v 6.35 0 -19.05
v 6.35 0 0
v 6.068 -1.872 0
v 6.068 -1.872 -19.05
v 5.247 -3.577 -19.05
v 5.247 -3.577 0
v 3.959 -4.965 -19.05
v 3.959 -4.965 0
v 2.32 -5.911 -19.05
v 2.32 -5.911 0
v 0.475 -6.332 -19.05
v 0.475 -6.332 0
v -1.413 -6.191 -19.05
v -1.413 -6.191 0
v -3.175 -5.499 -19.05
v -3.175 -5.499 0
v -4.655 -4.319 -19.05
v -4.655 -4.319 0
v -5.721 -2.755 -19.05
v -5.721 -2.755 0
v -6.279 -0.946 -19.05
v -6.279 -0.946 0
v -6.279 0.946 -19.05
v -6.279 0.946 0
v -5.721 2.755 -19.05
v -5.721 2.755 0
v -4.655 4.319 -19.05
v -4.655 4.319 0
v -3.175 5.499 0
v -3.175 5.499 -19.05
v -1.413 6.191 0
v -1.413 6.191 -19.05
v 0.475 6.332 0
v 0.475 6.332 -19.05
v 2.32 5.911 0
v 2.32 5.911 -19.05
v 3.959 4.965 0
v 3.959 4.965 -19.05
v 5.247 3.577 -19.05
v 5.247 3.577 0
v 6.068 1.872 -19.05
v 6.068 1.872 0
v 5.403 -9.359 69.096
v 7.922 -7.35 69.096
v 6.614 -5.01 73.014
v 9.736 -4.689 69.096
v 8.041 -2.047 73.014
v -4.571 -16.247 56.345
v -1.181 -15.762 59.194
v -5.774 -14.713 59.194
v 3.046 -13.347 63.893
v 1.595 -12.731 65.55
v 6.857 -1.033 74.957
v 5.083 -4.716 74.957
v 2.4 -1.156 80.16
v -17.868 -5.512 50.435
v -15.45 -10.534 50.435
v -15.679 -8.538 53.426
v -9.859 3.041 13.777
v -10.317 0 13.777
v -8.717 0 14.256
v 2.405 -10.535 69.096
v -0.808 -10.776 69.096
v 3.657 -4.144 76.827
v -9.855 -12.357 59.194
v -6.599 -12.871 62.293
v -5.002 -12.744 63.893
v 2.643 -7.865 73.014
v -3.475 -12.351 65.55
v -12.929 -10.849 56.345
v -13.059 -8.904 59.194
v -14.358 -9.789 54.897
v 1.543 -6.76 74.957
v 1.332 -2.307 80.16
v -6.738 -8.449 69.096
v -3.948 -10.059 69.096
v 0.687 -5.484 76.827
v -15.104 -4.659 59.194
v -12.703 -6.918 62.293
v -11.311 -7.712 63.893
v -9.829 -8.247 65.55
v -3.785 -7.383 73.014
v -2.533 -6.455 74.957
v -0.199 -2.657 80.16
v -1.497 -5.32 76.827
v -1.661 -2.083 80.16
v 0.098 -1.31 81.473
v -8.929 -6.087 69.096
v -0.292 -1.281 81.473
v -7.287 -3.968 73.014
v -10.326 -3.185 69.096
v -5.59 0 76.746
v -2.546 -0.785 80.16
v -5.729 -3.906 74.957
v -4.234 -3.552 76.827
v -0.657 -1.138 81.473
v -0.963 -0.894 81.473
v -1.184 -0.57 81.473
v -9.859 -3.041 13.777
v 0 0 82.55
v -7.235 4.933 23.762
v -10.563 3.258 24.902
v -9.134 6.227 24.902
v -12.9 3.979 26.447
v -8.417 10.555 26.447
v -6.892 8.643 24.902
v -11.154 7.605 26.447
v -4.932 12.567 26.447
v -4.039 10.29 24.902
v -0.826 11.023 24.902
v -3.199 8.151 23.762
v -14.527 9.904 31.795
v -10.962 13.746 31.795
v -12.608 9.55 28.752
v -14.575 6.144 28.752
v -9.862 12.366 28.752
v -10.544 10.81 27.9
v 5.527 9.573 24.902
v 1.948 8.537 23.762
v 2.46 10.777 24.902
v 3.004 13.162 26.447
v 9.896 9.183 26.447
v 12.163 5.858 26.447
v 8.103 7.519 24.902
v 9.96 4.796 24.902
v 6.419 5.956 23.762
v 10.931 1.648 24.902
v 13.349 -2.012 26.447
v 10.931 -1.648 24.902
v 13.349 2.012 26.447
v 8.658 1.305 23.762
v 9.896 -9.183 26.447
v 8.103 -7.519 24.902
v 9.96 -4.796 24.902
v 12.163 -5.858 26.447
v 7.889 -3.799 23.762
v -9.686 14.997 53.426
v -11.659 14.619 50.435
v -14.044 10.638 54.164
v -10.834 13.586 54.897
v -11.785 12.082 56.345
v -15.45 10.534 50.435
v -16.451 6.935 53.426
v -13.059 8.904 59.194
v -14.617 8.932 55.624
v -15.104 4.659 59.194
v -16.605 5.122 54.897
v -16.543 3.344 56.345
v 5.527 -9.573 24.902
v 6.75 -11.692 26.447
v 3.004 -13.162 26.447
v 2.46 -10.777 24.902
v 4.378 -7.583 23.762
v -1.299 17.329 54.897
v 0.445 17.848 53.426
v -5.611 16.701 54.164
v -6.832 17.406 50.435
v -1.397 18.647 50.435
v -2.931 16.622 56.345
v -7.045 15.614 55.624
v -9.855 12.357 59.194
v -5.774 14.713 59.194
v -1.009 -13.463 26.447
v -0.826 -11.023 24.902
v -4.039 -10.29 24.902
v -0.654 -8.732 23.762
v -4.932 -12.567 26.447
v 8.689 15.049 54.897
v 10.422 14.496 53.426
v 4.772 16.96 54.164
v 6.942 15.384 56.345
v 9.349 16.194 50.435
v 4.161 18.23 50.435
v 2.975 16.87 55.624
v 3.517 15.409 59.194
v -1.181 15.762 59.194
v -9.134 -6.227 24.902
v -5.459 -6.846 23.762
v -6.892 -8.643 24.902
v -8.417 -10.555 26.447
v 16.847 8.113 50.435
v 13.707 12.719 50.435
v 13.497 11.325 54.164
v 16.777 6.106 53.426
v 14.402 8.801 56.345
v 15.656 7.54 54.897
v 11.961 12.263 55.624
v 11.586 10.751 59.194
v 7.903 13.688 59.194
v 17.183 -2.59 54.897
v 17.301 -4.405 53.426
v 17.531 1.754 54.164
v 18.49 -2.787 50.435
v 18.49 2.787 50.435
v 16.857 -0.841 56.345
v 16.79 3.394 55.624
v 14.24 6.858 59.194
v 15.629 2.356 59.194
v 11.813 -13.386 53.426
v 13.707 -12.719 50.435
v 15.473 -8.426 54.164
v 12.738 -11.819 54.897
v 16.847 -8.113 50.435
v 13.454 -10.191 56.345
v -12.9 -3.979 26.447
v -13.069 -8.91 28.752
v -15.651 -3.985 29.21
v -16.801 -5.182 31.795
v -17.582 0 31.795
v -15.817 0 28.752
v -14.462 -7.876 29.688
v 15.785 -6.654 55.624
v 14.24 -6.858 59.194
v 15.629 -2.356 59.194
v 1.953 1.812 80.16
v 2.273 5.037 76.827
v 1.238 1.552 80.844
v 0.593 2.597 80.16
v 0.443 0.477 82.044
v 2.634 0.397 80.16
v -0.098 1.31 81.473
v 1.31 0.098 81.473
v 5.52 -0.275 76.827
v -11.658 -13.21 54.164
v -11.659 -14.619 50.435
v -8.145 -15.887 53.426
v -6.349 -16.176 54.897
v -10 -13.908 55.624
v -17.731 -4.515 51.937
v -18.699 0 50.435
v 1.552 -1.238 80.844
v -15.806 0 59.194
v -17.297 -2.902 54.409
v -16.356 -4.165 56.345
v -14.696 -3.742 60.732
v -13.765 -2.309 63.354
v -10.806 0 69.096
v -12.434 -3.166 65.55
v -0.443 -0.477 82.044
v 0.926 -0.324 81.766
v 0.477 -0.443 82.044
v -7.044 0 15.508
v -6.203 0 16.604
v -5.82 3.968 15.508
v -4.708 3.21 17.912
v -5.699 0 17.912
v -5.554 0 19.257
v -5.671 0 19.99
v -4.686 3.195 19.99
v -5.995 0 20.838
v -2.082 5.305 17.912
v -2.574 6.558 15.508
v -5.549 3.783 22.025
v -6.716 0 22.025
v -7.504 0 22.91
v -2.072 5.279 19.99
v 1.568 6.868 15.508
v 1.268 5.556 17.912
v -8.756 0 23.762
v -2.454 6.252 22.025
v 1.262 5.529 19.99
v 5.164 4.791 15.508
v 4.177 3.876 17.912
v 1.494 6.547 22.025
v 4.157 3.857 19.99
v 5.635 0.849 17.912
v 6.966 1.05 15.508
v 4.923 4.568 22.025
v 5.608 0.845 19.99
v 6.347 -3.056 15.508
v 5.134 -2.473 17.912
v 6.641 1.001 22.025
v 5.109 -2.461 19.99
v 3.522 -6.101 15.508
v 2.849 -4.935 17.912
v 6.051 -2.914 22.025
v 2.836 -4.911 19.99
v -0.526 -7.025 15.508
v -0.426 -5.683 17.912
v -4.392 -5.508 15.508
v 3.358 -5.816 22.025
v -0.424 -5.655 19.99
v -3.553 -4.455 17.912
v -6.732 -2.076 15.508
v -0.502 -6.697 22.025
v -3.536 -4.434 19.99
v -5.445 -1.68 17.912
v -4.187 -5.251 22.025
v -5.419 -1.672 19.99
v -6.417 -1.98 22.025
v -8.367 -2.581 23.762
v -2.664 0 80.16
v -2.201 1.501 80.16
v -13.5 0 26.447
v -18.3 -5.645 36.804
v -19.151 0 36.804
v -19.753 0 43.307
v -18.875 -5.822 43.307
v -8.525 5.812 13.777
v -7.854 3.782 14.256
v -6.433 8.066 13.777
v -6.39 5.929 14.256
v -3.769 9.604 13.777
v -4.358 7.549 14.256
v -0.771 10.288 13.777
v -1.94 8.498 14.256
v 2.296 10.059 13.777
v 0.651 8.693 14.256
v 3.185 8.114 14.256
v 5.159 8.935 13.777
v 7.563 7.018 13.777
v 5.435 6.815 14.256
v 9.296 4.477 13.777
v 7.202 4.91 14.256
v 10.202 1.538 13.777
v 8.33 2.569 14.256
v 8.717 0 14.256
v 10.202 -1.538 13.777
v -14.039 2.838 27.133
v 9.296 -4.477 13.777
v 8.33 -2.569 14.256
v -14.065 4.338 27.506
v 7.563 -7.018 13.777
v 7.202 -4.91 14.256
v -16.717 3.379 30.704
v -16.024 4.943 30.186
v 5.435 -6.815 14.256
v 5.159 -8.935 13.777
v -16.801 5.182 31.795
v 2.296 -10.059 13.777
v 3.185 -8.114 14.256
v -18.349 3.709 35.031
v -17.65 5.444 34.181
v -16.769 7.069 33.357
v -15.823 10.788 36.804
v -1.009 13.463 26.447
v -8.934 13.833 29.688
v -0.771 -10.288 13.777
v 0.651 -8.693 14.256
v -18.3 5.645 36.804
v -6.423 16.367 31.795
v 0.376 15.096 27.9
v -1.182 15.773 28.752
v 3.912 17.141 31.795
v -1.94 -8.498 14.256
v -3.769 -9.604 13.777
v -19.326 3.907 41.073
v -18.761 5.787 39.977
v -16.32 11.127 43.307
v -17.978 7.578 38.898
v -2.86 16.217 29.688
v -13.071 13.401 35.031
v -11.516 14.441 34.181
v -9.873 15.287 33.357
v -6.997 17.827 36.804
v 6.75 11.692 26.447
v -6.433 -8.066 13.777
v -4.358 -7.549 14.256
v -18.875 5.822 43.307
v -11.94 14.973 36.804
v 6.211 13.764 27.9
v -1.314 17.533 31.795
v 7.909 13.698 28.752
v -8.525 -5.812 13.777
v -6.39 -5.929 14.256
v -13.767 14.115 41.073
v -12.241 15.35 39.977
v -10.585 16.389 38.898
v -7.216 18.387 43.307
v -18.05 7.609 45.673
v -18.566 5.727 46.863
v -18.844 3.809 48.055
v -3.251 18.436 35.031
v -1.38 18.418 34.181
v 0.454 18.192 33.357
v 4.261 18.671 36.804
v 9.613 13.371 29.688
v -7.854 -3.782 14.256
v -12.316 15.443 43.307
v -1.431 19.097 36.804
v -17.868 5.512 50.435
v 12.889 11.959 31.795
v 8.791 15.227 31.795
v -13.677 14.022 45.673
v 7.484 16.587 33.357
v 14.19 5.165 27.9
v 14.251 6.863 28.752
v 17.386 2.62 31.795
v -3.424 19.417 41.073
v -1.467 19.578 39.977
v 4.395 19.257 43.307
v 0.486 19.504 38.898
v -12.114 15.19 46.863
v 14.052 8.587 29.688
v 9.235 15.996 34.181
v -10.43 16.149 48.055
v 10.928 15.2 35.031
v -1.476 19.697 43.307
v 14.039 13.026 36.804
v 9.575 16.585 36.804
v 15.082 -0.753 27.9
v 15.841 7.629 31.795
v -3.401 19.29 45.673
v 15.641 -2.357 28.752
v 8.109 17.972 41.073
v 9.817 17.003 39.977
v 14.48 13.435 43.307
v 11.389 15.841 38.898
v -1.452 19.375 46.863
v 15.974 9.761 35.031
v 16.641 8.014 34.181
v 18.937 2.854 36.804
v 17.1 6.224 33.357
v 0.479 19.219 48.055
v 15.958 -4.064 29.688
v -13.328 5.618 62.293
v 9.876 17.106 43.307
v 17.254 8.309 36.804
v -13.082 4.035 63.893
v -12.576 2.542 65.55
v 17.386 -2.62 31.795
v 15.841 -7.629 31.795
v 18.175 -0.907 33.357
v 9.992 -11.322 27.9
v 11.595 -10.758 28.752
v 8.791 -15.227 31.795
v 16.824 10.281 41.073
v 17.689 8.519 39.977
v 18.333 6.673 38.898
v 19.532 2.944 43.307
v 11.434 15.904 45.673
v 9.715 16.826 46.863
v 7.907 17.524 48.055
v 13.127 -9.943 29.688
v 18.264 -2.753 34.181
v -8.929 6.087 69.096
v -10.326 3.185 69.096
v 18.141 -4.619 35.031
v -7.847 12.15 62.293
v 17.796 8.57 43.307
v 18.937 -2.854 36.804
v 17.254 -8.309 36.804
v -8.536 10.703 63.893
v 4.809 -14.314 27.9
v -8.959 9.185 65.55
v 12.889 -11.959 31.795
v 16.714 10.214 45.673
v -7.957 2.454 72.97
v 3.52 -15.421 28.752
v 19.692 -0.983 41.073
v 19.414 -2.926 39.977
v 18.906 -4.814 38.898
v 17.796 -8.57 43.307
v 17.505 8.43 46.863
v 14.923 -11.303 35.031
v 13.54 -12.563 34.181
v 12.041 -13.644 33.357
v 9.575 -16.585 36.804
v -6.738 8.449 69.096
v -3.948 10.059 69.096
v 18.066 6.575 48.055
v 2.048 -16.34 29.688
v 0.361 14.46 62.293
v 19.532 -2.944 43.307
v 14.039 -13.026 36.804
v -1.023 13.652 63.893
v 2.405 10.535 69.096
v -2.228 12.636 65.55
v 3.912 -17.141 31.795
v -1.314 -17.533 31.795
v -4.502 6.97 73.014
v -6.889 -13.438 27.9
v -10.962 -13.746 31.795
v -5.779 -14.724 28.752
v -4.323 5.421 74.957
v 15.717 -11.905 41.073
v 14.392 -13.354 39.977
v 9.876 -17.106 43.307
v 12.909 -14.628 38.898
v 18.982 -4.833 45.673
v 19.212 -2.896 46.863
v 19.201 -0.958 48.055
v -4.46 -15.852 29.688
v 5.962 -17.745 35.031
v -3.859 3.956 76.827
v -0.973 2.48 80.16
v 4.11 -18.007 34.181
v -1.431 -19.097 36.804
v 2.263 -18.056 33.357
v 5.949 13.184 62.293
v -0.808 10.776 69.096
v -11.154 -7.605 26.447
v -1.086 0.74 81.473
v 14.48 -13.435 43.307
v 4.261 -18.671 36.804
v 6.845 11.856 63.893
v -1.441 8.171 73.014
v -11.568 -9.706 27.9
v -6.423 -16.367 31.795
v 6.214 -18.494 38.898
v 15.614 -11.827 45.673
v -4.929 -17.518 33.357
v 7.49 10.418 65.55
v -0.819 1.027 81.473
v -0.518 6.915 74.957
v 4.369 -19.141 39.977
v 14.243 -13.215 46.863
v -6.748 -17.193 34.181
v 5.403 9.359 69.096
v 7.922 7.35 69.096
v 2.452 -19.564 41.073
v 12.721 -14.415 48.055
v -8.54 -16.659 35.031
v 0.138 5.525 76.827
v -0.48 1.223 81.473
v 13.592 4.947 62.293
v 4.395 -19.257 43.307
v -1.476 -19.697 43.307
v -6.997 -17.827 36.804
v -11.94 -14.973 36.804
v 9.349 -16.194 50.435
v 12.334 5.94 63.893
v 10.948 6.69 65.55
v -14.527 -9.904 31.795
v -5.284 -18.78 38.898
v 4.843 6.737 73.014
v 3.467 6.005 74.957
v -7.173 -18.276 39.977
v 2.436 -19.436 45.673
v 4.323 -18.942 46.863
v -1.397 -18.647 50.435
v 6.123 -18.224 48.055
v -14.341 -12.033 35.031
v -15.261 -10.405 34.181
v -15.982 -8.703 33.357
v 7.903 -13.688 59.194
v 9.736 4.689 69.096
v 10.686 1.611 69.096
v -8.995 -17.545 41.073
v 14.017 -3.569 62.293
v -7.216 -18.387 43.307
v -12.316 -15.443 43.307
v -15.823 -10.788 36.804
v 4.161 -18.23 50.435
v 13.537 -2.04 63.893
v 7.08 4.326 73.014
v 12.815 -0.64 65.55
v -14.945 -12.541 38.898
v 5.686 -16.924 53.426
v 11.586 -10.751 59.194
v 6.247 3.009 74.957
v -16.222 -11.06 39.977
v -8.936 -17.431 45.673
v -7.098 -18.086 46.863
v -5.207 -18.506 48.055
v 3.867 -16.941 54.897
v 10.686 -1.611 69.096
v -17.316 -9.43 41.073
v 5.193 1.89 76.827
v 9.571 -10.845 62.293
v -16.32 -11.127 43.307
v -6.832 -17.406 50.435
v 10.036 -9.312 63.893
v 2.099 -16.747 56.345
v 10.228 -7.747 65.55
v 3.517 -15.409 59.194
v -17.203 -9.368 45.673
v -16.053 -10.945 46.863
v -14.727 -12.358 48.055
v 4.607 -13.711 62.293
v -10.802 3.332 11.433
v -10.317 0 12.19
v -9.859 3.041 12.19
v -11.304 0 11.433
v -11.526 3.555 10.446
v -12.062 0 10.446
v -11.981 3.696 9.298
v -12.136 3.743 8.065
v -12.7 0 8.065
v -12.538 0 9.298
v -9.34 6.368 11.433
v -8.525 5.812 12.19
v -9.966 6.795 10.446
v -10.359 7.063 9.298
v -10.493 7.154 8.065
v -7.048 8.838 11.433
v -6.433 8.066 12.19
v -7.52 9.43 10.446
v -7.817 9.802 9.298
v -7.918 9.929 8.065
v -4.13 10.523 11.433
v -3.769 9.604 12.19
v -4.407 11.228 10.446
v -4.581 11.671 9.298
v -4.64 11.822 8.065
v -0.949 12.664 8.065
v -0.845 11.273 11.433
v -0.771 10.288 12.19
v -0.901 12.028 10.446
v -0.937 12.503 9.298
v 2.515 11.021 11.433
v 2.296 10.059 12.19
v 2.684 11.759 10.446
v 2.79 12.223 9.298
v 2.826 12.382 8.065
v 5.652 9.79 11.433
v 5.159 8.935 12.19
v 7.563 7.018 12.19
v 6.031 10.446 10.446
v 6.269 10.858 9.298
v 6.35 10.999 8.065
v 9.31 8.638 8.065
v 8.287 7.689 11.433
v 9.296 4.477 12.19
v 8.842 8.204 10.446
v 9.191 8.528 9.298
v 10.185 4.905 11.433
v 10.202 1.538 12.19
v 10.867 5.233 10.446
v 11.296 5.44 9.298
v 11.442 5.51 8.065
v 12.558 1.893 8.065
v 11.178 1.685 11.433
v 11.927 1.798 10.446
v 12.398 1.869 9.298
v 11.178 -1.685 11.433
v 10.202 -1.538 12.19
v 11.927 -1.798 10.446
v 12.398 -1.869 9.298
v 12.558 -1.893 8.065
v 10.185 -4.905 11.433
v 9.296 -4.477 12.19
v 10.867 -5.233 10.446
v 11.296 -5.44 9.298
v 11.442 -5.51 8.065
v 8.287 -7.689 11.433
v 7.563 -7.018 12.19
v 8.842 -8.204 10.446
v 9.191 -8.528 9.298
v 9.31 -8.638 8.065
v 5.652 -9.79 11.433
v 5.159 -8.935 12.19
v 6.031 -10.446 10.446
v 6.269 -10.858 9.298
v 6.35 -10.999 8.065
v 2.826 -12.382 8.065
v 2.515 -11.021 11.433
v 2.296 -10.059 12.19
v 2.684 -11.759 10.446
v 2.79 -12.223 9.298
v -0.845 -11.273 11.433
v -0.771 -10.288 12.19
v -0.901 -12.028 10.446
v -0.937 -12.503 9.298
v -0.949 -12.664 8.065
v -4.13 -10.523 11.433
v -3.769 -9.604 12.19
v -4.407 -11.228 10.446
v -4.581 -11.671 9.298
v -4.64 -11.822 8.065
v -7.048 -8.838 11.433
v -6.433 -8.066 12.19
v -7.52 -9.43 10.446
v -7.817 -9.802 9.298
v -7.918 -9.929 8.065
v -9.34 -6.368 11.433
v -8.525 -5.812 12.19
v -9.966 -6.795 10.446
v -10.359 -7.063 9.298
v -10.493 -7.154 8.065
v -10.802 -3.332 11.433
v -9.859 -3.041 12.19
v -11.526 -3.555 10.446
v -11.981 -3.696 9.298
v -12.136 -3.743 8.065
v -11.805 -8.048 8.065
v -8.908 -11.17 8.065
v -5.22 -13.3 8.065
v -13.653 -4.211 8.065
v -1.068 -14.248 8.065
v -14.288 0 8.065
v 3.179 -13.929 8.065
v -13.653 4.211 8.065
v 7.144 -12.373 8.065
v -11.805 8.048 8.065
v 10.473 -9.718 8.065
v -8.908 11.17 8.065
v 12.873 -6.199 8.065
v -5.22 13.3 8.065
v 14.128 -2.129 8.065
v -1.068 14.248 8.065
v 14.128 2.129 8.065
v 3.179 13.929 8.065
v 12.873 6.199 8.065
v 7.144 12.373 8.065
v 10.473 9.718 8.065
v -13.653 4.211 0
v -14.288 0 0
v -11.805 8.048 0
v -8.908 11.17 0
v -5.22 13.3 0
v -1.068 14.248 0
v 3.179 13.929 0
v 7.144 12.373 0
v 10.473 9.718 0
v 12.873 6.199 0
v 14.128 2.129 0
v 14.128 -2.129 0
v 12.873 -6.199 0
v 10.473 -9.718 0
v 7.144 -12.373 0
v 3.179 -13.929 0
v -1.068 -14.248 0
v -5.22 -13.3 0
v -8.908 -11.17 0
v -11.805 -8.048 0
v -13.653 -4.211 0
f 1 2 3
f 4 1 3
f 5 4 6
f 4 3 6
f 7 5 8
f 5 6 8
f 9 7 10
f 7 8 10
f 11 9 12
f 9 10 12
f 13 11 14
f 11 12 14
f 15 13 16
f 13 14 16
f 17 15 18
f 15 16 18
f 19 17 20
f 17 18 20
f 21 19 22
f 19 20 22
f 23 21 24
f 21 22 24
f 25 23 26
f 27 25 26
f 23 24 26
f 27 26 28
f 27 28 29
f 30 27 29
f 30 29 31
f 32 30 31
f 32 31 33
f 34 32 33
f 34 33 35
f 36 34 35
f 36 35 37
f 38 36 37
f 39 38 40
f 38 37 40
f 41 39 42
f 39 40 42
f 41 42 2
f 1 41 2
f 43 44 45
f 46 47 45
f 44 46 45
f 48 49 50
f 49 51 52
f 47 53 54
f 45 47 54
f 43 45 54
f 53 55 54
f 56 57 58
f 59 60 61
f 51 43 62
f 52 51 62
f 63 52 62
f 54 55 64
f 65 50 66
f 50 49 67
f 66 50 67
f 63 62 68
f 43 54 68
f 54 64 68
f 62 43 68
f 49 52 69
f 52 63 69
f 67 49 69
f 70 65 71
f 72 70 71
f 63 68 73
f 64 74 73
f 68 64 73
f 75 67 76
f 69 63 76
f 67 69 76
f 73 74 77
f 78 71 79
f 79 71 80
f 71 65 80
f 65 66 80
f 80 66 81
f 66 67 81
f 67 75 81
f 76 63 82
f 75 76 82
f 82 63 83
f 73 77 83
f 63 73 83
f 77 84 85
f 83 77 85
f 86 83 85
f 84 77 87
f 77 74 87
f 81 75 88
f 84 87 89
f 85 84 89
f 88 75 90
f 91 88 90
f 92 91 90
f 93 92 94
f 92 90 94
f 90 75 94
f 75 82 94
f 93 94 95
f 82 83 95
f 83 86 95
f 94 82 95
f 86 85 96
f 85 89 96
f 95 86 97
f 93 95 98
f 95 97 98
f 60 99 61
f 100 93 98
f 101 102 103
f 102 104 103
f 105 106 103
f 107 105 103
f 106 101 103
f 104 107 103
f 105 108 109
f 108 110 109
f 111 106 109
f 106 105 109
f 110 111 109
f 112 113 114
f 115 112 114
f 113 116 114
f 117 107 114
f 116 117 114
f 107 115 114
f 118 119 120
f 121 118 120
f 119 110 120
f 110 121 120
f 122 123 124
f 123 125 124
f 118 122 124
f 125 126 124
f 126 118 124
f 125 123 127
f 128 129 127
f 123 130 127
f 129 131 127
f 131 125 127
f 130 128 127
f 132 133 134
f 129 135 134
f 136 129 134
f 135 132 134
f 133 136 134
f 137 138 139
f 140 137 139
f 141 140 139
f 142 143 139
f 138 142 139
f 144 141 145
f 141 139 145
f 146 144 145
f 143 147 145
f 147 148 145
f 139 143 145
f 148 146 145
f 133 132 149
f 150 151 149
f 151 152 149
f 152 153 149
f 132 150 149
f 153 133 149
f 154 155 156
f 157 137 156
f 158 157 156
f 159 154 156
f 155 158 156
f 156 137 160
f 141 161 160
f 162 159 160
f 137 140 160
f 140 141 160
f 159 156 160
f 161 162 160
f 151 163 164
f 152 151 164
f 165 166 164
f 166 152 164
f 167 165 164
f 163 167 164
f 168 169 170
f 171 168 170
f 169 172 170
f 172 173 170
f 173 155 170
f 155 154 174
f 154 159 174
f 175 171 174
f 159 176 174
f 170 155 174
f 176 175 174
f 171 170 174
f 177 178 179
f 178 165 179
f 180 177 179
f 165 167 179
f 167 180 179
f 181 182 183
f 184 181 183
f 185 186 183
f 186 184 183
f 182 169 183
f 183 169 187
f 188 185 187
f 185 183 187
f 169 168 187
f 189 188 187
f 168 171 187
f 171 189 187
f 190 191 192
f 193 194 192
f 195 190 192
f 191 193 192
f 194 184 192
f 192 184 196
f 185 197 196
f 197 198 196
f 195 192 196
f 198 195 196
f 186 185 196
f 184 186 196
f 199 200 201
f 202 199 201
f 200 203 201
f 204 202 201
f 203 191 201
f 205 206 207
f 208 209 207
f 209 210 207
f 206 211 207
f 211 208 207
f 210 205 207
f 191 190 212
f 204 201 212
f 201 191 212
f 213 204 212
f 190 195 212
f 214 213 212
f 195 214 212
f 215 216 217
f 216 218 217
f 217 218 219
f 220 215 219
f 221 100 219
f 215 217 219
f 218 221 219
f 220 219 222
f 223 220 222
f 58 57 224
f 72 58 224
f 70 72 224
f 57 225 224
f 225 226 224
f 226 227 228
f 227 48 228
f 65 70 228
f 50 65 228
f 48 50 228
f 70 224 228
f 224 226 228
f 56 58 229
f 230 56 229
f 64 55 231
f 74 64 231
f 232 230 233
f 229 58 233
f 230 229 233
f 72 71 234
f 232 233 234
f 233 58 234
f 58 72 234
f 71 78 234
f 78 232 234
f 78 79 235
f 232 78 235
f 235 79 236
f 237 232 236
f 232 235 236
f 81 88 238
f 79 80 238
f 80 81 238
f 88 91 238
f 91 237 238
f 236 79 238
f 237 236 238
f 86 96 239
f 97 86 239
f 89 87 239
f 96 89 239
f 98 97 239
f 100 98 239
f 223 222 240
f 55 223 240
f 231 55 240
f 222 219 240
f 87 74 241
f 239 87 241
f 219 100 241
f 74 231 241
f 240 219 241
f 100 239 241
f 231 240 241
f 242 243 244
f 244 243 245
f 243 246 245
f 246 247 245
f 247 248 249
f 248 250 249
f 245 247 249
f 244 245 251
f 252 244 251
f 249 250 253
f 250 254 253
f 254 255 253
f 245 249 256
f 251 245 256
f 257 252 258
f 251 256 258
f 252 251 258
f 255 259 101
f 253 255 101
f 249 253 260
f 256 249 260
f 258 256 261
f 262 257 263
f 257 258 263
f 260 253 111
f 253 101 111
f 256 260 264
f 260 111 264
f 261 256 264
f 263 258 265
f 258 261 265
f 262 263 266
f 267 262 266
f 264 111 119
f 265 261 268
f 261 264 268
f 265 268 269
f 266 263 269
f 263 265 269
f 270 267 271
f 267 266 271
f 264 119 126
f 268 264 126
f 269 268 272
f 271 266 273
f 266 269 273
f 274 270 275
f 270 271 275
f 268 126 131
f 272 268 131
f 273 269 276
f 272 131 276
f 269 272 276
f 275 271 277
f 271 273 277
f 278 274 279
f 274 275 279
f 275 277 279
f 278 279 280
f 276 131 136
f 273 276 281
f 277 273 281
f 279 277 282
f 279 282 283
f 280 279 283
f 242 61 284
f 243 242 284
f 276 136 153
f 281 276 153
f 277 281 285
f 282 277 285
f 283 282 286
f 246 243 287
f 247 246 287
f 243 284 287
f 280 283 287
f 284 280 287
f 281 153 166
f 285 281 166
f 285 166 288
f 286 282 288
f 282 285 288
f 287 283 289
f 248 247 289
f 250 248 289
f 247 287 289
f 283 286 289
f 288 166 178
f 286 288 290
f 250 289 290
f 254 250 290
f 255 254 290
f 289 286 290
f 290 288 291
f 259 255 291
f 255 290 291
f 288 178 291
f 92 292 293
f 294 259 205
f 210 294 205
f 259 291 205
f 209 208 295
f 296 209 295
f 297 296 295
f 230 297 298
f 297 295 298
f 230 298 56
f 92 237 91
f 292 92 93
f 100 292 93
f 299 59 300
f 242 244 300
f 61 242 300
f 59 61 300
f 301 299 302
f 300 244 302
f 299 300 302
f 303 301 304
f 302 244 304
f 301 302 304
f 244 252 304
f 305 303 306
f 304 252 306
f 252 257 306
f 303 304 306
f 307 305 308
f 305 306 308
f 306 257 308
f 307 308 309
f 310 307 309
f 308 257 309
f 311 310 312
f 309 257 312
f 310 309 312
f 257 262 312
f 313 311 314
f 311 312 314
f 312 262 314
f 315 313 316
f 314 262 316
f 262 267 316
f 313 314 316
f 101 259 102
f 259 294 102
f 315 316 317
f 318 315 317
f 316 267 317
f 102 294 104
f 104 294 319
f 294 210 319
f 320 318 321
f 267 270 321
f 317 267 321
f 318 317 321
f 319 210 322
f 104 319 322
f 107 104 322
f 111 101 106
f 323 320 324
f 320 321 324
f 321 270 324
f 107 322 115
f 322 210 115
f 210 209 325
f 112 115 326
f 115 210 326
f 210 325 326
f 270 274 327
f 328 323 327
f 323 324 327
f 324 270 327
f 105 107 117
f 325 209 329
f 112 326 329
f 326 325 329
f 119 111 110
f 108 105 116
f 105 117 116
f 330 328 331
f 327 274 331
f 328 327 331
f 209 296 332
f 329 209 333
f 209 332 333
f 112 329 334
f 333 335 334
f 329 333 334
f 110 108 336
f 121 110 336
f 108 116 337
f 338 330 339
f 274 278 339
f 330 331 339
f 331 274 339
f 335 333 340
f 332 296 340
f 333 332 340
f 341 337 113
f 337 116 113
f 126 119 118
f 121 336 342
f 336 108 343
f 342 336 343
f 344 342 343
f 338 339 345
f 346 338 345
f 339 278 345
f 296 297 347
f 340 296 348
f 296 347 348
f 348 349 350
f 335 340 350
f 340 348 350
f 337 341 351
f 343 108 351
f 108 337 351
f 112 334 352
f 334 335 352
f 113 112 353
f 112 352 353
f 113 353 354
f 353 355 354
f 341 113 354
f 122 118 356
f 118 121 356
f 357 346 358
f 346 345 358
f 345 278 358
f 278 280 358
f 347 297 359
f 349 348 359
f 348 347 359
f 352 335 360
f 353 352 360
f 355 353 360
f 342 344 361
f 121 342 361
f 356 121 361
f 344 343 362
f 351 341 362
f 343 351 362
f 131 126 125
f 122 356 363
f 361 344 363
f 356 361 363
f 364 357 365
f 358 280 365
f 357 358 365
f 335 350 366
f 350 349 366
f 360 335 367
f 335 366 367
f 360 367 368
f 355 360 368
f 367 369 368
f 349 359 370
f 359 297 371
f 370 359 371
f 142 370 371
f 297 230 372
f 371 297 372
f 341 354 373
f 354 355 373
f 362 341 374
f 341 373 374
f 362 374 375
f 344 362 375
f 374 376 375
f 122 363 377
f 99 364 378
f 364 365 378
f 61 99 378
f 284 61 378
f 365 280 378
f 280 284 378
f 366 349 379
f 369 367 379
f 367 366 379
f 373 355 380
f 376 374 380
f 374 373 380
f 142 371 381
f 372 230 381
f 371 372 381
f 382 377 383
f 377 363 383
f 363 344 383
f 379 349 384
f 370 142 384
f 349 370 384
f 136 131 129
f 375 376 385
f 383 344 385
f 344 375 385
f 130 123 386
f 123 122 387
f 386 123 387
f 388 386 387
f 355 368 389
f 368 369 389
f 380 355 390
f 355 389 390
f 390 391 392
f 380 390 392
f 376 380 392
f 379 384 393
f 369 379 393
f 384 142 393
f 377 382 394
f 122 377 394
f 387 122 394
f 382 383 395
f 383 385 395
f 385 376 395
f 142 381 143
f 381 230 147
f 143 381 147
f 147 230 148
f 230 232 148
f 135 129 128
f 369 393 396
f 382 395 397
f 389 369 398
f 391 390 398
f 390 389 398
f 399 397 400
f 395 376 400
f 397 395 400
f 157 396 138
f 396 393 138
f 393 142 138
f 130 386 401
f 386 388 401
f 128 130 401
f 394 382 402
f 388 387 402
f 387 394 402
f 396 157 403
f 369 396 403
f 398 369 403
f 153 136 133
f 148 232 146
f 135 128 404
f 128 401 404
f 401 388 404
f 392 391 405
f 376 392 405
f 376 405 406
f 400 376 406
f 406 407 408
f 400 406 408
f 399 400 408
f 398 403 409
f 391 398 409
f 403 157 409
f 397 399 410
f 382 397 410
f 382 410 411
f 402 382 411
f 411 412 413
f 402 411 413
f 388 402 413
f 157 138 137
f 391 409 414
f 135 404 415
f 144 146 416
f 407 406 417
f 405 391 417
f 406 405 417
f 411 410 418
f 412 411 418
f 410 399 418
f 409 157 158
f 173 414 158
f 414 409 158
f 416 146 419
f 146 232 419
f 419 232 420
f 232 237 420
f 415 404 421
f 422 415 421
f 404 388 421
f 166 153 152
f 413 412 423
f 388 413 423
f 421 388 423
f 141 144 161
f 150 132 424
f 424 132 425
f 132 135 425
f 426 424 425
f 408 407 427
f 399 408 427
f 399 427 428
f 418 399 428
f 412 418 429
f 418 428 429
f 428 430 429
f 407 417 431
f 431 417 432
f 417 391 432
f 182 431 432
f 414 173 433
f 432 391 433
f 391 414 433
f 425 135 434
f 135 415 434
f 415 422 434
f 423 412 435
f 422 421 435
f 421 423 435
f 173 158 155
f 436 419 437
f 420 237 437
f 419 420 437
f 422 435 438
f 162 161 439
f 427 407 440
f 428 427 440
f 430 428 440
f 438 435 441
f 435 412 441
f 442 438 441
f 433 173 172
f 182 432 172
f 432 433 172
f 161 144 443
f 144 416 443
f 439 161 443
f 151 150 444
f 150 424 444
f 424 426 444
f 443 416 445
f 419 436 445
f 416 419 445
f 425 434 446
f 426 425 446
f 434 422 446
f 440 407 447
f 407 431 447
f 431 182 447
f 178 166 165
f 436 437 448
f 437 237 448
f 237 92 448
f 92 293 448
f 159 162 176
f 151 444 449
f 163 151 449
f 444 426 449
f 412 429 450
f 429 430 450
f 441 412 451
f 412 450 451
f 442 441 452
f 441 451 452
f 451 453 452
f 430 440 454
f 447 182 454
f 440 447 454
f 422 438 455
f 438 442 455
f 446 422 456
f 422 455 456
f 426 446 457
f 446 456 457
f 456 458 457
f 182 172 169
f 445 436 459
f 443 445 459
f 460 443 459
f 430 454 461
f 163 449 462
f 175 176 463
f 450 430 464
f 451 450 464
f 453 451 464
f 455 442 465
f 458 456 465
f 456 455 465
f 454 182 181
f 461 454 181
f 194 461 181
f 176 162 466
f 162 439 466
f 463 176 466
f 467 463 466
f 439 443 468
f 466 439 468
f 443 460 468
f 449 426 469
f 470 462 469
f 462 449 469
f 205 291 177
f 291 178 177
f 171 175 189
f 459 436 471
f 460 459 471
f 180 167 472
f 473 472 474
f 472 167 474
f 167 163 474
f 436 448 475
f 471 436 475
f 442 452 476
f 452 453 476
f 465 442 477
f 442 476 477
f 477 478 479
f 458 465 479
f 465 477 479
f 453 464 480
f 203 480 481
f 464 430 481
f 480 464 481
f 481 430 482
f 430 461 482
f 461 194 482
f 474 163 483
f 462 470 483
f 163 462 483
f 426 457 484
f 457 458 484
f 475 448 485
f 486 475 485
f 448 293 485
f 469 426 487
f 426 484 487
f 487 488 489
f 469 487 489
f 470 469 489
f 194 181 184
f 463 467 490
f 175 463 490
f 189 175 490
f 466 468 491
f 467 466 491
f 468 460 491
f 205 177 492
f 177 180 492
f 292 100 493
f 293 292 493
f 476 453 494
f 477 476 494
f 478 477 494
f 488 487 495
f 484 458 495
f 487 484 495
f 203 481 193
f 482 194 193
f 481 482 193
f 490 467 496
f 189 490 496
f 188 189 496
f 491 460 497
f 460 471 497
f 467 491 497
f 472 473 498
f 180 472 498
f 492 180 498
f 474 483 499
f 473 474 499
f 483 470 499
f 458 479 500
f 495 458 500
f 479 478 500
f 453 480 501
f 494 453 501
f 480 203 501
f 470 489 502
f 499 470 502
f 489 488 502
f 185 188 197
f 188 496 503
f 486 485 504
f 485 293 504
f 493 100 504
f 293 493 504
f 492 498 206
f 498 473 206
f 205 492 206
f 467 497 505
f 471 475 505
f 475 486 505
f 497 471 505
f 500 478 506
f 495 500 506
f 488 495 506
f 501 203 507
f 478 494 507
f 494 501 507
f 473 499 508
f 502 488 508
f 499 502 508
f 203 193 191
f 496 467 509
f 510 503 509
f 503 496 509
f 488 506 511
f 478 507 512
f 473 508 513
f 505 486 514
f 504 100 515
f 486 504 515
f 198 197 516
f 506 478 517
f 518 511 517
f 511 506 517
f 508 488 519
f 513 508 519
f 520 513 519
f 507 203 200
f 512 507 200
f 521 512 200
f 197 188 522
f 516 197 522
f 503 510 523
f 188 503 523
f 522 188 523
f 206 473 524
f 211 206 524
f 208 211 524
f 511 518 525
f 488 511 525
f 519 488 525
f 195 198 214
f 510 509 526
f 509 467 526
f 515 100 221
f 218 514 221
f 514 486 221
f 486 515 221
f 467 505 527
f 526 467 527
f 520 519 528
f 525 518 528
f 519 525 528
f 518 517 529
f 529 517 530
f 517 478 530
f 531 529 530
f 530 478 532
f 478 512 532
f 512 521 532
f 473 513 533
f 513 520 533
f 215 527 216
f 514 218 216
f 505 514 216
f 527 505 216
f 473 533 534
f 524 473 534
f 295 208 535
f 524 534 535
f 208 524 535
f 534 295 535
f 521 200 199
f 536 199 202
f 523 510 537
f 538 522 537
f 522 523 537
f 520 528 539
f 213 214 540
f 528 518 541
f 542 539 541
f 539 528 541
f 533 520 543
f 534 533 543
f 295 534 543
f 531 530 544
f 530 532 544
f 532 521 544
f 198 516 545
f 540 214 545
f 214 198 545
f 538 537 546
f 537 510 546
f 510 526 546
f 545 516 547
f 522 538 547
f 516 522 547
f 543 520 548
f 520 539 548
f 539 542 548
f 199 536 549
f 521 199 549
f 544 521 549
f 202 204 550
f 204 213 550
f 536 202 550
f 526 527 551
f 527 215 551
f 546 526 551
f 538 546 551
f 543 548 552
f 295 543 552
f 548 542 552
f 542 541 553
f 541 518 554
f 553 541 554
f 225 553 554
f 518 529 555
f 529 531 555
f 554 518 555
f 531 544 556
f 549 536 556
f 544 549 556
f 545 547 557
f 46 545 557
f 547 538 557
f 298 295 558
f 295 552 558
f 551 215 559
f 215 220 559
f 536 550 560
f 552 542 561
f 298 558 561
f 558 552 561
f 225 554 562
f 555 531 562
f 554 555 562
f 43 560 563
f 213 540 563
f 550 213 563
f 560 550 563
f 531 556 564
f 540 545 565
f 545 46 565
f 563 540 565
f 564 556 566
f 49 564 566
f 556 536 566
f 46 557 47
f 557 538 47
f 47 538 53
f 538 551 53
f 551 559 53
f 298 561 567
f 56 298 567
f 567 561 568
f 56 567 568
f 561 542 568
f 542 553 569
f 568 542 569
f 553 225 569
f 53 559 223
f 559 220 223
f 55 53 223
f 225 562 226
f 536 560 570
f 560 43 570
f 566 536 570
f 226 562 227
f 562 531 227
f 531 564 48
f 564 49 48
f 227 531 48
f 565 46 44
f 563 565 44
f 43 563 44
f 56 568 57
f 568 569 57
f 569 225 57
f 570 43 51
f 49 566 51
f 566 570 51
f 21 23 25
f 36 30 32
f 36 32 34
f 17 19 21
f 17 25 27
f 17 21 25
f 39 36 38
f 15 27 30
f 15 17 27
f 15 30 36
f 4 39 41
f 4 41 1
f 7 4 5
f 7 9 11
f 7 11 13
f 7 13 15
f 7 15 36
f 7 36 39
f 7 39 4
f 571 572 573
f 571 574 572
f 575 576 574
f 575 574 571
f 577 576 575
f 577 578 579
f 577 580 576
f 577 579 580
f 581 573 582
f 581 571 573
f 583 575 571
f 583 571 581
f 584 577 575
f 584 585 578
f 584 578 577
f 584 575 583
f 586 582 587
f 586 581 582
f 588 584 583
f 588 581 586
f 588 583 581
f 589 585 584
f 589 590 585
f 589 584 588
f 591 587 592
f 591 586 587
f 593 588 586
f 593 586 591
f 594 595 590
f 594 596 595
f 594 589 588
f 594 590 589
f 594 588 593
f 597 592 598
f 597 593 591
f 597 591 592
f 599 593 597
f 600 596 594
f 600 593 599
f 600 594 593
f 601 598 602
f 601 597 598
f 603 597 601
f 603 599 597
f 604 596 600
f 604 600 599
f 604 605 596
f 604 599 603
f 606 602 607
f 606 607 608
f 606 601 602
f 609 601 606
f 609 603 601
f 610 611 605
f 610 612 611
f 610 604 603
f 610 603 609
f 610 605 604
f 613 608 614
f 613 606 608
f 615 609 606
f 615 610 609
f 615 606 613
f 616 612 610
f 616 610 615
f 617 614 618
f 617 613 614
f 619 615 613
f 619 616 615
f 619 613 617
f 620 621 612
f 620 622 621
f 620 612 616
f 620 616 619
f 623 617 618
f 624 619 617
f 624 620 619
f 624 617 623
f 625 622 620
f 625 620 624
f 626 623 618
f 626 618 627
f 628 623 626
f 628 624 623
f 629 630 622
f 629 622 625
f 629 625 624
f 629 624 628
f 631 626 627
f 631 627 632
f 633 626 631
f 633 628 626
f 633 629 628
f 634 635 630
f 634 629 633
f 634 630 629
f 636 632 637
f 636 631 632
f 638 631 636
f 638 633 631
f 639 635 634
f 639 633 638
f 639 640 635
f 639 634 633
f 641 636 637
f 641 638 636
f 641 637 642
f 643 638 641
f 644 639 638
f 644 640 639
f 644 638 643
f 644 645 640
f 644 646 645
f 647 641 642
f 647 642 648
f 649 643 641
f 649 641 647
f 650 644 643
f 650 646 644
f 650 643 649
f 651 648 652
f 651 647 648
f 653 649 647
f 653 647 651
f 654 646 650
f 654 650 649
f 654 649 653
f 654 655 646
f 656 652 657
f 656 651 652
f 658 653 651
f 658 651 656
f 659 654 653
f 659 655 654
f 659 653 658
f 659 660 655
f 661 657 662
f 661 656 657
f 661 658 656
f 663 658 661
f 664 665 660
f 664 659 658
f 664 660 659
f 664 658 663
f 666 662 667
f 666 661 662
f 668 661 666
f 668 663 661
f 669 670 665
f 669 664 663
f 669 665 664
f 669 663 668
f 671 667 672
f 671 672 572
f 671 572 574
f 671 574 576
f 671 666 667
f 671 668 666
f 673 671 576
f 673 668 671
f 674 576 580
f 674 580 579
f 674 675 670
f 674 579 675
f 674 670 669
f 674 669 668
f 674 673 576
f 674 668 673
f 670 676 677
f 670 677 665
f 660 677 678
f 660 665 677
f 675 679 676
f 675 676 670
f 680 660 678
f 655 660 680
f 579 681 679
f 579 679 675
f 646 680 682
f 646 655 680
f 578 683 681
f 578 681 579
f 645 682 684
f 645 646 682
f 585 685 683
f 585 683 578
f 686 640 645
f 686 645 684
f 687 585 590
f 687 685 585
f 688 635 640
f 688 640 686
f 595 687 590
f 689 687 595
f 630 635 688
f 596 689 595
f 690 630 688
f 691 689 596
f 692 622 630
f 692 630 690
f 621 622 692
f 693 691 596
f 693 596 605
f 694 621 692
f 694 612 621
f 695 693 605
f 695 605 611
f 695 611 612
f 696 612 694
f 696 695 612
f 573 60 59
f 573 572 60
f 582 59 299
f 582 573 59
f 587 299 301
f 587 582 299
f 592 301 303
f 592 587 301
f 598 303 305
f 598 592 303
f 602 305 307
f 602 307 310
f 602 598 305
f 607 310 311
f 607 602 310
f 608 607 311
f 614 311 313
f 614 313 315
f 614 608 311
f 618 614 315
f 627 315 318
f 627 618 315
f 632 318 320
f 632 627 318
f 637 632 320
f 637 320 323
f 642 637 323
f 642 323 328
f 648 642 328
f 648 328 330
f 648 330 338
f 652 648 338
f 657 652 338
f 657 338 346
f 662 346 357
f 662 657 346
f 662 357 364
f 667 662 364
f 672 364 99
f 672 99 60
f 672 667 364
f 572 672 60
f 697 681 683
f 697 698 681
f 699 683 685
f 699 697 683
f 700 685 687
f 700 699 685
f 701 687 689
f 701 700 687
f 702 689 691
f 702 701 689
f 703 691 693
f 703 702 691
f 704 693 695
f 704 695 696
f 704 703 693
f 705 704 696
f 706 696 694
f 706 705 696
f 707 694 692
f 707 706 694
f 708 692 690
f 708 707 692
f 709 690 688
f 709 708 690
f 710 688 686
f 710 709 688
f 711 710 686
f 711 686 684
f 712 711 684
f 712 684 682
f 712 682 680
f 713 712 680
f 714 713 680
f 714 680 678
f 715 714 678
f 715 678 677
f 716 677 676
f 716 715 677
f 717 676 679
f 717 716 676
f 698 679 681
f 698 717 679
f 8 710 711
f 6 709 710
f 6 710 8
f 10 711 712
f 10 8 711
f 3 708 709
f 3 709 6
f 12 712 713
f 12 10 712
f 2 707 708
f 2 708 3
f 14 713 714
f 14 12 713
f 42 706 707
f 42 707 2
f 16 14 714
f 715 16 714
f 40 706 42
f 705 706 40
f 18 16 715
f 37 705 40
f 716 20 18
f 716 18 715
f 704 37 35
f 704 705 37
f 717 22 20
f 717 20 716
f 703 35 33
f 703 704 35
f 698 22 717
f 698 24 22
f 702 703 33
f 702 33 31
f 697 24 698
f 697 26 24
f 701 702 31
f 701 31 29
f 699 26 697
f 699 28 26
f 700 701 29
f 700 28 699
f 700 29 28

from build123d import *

# Parameters (mm, degrees)
F2_R     = 6.35
F3_DEPTH = 19.05


with BuildPart() as f1:
    # F0 (on Front) → F1 (revolve)
    with BuildSketch(Plane.XZ):
        with BuildLine():
            Line((-14.2875, 0), (0, 0))
            Line((0, 0), (0, 82.55))
            add(Edge.make_bspline(
                [(-10.3173267766, 13.7772673566), (-9.7542577342, 13.9189949448), (-8.7837192186, 14.0342974796), (-6.7366964189, 15.6271610186), (-5.7831889647, 17.2510746377), (-5.3274903025, 19.561240103), (-6.3597783763, 21.6465588891), (-7.8655763238, 23.5184731931), (-11.4427663168, 24.8942017837), (-15.9643108763, 28.067693587), (-19.0623897098, 34.6572420873), (-20.4563878975, 44.6646724068), (-17.1595032199, 56.3004961078), (-12.3601997394, 67.5904391591), (-3.8765890058, 79.7095969319), (0, 82.55)],
                knots=[0, 0, 0, 0, 0.0415999938, 0.0933658969, 0.139413565, 0.1887556661, 0.2383289481, 0.28858266, 0.352549029, 0.4293674027, 0.5174702969, 0.6222470639, 0.7355863968, 0.8559952045, 1, 1, 1, 1], degree=3))
            Line((-10.3173267766, 13.7772673566), (-10.3173267766, 12.1897673566))
            ThreePointArc((-10.3173267766, 12.1897673566), (-12.0615351158, 10.4464615054), (-12.7, 8.0645))
            Line((-12.7, 8.0645), (-14.2875, 8.0645))
            Line((-14.2875, 8.0645), (-14.2875, 0))
        make_face()
    revolve(axis=Axis((0, 0, 41.275), (0, 0, -1)))

    # F2 (on face) → F3 (join)
    with BuildSketch(Plane(origin=(0, 0, 0), x_dir=(1, 0, 0), z_dir=(0, 0, -1))):
        Circle(F2_R)
    extrude(amount=F3_DEPTH)


solid = f1.part
